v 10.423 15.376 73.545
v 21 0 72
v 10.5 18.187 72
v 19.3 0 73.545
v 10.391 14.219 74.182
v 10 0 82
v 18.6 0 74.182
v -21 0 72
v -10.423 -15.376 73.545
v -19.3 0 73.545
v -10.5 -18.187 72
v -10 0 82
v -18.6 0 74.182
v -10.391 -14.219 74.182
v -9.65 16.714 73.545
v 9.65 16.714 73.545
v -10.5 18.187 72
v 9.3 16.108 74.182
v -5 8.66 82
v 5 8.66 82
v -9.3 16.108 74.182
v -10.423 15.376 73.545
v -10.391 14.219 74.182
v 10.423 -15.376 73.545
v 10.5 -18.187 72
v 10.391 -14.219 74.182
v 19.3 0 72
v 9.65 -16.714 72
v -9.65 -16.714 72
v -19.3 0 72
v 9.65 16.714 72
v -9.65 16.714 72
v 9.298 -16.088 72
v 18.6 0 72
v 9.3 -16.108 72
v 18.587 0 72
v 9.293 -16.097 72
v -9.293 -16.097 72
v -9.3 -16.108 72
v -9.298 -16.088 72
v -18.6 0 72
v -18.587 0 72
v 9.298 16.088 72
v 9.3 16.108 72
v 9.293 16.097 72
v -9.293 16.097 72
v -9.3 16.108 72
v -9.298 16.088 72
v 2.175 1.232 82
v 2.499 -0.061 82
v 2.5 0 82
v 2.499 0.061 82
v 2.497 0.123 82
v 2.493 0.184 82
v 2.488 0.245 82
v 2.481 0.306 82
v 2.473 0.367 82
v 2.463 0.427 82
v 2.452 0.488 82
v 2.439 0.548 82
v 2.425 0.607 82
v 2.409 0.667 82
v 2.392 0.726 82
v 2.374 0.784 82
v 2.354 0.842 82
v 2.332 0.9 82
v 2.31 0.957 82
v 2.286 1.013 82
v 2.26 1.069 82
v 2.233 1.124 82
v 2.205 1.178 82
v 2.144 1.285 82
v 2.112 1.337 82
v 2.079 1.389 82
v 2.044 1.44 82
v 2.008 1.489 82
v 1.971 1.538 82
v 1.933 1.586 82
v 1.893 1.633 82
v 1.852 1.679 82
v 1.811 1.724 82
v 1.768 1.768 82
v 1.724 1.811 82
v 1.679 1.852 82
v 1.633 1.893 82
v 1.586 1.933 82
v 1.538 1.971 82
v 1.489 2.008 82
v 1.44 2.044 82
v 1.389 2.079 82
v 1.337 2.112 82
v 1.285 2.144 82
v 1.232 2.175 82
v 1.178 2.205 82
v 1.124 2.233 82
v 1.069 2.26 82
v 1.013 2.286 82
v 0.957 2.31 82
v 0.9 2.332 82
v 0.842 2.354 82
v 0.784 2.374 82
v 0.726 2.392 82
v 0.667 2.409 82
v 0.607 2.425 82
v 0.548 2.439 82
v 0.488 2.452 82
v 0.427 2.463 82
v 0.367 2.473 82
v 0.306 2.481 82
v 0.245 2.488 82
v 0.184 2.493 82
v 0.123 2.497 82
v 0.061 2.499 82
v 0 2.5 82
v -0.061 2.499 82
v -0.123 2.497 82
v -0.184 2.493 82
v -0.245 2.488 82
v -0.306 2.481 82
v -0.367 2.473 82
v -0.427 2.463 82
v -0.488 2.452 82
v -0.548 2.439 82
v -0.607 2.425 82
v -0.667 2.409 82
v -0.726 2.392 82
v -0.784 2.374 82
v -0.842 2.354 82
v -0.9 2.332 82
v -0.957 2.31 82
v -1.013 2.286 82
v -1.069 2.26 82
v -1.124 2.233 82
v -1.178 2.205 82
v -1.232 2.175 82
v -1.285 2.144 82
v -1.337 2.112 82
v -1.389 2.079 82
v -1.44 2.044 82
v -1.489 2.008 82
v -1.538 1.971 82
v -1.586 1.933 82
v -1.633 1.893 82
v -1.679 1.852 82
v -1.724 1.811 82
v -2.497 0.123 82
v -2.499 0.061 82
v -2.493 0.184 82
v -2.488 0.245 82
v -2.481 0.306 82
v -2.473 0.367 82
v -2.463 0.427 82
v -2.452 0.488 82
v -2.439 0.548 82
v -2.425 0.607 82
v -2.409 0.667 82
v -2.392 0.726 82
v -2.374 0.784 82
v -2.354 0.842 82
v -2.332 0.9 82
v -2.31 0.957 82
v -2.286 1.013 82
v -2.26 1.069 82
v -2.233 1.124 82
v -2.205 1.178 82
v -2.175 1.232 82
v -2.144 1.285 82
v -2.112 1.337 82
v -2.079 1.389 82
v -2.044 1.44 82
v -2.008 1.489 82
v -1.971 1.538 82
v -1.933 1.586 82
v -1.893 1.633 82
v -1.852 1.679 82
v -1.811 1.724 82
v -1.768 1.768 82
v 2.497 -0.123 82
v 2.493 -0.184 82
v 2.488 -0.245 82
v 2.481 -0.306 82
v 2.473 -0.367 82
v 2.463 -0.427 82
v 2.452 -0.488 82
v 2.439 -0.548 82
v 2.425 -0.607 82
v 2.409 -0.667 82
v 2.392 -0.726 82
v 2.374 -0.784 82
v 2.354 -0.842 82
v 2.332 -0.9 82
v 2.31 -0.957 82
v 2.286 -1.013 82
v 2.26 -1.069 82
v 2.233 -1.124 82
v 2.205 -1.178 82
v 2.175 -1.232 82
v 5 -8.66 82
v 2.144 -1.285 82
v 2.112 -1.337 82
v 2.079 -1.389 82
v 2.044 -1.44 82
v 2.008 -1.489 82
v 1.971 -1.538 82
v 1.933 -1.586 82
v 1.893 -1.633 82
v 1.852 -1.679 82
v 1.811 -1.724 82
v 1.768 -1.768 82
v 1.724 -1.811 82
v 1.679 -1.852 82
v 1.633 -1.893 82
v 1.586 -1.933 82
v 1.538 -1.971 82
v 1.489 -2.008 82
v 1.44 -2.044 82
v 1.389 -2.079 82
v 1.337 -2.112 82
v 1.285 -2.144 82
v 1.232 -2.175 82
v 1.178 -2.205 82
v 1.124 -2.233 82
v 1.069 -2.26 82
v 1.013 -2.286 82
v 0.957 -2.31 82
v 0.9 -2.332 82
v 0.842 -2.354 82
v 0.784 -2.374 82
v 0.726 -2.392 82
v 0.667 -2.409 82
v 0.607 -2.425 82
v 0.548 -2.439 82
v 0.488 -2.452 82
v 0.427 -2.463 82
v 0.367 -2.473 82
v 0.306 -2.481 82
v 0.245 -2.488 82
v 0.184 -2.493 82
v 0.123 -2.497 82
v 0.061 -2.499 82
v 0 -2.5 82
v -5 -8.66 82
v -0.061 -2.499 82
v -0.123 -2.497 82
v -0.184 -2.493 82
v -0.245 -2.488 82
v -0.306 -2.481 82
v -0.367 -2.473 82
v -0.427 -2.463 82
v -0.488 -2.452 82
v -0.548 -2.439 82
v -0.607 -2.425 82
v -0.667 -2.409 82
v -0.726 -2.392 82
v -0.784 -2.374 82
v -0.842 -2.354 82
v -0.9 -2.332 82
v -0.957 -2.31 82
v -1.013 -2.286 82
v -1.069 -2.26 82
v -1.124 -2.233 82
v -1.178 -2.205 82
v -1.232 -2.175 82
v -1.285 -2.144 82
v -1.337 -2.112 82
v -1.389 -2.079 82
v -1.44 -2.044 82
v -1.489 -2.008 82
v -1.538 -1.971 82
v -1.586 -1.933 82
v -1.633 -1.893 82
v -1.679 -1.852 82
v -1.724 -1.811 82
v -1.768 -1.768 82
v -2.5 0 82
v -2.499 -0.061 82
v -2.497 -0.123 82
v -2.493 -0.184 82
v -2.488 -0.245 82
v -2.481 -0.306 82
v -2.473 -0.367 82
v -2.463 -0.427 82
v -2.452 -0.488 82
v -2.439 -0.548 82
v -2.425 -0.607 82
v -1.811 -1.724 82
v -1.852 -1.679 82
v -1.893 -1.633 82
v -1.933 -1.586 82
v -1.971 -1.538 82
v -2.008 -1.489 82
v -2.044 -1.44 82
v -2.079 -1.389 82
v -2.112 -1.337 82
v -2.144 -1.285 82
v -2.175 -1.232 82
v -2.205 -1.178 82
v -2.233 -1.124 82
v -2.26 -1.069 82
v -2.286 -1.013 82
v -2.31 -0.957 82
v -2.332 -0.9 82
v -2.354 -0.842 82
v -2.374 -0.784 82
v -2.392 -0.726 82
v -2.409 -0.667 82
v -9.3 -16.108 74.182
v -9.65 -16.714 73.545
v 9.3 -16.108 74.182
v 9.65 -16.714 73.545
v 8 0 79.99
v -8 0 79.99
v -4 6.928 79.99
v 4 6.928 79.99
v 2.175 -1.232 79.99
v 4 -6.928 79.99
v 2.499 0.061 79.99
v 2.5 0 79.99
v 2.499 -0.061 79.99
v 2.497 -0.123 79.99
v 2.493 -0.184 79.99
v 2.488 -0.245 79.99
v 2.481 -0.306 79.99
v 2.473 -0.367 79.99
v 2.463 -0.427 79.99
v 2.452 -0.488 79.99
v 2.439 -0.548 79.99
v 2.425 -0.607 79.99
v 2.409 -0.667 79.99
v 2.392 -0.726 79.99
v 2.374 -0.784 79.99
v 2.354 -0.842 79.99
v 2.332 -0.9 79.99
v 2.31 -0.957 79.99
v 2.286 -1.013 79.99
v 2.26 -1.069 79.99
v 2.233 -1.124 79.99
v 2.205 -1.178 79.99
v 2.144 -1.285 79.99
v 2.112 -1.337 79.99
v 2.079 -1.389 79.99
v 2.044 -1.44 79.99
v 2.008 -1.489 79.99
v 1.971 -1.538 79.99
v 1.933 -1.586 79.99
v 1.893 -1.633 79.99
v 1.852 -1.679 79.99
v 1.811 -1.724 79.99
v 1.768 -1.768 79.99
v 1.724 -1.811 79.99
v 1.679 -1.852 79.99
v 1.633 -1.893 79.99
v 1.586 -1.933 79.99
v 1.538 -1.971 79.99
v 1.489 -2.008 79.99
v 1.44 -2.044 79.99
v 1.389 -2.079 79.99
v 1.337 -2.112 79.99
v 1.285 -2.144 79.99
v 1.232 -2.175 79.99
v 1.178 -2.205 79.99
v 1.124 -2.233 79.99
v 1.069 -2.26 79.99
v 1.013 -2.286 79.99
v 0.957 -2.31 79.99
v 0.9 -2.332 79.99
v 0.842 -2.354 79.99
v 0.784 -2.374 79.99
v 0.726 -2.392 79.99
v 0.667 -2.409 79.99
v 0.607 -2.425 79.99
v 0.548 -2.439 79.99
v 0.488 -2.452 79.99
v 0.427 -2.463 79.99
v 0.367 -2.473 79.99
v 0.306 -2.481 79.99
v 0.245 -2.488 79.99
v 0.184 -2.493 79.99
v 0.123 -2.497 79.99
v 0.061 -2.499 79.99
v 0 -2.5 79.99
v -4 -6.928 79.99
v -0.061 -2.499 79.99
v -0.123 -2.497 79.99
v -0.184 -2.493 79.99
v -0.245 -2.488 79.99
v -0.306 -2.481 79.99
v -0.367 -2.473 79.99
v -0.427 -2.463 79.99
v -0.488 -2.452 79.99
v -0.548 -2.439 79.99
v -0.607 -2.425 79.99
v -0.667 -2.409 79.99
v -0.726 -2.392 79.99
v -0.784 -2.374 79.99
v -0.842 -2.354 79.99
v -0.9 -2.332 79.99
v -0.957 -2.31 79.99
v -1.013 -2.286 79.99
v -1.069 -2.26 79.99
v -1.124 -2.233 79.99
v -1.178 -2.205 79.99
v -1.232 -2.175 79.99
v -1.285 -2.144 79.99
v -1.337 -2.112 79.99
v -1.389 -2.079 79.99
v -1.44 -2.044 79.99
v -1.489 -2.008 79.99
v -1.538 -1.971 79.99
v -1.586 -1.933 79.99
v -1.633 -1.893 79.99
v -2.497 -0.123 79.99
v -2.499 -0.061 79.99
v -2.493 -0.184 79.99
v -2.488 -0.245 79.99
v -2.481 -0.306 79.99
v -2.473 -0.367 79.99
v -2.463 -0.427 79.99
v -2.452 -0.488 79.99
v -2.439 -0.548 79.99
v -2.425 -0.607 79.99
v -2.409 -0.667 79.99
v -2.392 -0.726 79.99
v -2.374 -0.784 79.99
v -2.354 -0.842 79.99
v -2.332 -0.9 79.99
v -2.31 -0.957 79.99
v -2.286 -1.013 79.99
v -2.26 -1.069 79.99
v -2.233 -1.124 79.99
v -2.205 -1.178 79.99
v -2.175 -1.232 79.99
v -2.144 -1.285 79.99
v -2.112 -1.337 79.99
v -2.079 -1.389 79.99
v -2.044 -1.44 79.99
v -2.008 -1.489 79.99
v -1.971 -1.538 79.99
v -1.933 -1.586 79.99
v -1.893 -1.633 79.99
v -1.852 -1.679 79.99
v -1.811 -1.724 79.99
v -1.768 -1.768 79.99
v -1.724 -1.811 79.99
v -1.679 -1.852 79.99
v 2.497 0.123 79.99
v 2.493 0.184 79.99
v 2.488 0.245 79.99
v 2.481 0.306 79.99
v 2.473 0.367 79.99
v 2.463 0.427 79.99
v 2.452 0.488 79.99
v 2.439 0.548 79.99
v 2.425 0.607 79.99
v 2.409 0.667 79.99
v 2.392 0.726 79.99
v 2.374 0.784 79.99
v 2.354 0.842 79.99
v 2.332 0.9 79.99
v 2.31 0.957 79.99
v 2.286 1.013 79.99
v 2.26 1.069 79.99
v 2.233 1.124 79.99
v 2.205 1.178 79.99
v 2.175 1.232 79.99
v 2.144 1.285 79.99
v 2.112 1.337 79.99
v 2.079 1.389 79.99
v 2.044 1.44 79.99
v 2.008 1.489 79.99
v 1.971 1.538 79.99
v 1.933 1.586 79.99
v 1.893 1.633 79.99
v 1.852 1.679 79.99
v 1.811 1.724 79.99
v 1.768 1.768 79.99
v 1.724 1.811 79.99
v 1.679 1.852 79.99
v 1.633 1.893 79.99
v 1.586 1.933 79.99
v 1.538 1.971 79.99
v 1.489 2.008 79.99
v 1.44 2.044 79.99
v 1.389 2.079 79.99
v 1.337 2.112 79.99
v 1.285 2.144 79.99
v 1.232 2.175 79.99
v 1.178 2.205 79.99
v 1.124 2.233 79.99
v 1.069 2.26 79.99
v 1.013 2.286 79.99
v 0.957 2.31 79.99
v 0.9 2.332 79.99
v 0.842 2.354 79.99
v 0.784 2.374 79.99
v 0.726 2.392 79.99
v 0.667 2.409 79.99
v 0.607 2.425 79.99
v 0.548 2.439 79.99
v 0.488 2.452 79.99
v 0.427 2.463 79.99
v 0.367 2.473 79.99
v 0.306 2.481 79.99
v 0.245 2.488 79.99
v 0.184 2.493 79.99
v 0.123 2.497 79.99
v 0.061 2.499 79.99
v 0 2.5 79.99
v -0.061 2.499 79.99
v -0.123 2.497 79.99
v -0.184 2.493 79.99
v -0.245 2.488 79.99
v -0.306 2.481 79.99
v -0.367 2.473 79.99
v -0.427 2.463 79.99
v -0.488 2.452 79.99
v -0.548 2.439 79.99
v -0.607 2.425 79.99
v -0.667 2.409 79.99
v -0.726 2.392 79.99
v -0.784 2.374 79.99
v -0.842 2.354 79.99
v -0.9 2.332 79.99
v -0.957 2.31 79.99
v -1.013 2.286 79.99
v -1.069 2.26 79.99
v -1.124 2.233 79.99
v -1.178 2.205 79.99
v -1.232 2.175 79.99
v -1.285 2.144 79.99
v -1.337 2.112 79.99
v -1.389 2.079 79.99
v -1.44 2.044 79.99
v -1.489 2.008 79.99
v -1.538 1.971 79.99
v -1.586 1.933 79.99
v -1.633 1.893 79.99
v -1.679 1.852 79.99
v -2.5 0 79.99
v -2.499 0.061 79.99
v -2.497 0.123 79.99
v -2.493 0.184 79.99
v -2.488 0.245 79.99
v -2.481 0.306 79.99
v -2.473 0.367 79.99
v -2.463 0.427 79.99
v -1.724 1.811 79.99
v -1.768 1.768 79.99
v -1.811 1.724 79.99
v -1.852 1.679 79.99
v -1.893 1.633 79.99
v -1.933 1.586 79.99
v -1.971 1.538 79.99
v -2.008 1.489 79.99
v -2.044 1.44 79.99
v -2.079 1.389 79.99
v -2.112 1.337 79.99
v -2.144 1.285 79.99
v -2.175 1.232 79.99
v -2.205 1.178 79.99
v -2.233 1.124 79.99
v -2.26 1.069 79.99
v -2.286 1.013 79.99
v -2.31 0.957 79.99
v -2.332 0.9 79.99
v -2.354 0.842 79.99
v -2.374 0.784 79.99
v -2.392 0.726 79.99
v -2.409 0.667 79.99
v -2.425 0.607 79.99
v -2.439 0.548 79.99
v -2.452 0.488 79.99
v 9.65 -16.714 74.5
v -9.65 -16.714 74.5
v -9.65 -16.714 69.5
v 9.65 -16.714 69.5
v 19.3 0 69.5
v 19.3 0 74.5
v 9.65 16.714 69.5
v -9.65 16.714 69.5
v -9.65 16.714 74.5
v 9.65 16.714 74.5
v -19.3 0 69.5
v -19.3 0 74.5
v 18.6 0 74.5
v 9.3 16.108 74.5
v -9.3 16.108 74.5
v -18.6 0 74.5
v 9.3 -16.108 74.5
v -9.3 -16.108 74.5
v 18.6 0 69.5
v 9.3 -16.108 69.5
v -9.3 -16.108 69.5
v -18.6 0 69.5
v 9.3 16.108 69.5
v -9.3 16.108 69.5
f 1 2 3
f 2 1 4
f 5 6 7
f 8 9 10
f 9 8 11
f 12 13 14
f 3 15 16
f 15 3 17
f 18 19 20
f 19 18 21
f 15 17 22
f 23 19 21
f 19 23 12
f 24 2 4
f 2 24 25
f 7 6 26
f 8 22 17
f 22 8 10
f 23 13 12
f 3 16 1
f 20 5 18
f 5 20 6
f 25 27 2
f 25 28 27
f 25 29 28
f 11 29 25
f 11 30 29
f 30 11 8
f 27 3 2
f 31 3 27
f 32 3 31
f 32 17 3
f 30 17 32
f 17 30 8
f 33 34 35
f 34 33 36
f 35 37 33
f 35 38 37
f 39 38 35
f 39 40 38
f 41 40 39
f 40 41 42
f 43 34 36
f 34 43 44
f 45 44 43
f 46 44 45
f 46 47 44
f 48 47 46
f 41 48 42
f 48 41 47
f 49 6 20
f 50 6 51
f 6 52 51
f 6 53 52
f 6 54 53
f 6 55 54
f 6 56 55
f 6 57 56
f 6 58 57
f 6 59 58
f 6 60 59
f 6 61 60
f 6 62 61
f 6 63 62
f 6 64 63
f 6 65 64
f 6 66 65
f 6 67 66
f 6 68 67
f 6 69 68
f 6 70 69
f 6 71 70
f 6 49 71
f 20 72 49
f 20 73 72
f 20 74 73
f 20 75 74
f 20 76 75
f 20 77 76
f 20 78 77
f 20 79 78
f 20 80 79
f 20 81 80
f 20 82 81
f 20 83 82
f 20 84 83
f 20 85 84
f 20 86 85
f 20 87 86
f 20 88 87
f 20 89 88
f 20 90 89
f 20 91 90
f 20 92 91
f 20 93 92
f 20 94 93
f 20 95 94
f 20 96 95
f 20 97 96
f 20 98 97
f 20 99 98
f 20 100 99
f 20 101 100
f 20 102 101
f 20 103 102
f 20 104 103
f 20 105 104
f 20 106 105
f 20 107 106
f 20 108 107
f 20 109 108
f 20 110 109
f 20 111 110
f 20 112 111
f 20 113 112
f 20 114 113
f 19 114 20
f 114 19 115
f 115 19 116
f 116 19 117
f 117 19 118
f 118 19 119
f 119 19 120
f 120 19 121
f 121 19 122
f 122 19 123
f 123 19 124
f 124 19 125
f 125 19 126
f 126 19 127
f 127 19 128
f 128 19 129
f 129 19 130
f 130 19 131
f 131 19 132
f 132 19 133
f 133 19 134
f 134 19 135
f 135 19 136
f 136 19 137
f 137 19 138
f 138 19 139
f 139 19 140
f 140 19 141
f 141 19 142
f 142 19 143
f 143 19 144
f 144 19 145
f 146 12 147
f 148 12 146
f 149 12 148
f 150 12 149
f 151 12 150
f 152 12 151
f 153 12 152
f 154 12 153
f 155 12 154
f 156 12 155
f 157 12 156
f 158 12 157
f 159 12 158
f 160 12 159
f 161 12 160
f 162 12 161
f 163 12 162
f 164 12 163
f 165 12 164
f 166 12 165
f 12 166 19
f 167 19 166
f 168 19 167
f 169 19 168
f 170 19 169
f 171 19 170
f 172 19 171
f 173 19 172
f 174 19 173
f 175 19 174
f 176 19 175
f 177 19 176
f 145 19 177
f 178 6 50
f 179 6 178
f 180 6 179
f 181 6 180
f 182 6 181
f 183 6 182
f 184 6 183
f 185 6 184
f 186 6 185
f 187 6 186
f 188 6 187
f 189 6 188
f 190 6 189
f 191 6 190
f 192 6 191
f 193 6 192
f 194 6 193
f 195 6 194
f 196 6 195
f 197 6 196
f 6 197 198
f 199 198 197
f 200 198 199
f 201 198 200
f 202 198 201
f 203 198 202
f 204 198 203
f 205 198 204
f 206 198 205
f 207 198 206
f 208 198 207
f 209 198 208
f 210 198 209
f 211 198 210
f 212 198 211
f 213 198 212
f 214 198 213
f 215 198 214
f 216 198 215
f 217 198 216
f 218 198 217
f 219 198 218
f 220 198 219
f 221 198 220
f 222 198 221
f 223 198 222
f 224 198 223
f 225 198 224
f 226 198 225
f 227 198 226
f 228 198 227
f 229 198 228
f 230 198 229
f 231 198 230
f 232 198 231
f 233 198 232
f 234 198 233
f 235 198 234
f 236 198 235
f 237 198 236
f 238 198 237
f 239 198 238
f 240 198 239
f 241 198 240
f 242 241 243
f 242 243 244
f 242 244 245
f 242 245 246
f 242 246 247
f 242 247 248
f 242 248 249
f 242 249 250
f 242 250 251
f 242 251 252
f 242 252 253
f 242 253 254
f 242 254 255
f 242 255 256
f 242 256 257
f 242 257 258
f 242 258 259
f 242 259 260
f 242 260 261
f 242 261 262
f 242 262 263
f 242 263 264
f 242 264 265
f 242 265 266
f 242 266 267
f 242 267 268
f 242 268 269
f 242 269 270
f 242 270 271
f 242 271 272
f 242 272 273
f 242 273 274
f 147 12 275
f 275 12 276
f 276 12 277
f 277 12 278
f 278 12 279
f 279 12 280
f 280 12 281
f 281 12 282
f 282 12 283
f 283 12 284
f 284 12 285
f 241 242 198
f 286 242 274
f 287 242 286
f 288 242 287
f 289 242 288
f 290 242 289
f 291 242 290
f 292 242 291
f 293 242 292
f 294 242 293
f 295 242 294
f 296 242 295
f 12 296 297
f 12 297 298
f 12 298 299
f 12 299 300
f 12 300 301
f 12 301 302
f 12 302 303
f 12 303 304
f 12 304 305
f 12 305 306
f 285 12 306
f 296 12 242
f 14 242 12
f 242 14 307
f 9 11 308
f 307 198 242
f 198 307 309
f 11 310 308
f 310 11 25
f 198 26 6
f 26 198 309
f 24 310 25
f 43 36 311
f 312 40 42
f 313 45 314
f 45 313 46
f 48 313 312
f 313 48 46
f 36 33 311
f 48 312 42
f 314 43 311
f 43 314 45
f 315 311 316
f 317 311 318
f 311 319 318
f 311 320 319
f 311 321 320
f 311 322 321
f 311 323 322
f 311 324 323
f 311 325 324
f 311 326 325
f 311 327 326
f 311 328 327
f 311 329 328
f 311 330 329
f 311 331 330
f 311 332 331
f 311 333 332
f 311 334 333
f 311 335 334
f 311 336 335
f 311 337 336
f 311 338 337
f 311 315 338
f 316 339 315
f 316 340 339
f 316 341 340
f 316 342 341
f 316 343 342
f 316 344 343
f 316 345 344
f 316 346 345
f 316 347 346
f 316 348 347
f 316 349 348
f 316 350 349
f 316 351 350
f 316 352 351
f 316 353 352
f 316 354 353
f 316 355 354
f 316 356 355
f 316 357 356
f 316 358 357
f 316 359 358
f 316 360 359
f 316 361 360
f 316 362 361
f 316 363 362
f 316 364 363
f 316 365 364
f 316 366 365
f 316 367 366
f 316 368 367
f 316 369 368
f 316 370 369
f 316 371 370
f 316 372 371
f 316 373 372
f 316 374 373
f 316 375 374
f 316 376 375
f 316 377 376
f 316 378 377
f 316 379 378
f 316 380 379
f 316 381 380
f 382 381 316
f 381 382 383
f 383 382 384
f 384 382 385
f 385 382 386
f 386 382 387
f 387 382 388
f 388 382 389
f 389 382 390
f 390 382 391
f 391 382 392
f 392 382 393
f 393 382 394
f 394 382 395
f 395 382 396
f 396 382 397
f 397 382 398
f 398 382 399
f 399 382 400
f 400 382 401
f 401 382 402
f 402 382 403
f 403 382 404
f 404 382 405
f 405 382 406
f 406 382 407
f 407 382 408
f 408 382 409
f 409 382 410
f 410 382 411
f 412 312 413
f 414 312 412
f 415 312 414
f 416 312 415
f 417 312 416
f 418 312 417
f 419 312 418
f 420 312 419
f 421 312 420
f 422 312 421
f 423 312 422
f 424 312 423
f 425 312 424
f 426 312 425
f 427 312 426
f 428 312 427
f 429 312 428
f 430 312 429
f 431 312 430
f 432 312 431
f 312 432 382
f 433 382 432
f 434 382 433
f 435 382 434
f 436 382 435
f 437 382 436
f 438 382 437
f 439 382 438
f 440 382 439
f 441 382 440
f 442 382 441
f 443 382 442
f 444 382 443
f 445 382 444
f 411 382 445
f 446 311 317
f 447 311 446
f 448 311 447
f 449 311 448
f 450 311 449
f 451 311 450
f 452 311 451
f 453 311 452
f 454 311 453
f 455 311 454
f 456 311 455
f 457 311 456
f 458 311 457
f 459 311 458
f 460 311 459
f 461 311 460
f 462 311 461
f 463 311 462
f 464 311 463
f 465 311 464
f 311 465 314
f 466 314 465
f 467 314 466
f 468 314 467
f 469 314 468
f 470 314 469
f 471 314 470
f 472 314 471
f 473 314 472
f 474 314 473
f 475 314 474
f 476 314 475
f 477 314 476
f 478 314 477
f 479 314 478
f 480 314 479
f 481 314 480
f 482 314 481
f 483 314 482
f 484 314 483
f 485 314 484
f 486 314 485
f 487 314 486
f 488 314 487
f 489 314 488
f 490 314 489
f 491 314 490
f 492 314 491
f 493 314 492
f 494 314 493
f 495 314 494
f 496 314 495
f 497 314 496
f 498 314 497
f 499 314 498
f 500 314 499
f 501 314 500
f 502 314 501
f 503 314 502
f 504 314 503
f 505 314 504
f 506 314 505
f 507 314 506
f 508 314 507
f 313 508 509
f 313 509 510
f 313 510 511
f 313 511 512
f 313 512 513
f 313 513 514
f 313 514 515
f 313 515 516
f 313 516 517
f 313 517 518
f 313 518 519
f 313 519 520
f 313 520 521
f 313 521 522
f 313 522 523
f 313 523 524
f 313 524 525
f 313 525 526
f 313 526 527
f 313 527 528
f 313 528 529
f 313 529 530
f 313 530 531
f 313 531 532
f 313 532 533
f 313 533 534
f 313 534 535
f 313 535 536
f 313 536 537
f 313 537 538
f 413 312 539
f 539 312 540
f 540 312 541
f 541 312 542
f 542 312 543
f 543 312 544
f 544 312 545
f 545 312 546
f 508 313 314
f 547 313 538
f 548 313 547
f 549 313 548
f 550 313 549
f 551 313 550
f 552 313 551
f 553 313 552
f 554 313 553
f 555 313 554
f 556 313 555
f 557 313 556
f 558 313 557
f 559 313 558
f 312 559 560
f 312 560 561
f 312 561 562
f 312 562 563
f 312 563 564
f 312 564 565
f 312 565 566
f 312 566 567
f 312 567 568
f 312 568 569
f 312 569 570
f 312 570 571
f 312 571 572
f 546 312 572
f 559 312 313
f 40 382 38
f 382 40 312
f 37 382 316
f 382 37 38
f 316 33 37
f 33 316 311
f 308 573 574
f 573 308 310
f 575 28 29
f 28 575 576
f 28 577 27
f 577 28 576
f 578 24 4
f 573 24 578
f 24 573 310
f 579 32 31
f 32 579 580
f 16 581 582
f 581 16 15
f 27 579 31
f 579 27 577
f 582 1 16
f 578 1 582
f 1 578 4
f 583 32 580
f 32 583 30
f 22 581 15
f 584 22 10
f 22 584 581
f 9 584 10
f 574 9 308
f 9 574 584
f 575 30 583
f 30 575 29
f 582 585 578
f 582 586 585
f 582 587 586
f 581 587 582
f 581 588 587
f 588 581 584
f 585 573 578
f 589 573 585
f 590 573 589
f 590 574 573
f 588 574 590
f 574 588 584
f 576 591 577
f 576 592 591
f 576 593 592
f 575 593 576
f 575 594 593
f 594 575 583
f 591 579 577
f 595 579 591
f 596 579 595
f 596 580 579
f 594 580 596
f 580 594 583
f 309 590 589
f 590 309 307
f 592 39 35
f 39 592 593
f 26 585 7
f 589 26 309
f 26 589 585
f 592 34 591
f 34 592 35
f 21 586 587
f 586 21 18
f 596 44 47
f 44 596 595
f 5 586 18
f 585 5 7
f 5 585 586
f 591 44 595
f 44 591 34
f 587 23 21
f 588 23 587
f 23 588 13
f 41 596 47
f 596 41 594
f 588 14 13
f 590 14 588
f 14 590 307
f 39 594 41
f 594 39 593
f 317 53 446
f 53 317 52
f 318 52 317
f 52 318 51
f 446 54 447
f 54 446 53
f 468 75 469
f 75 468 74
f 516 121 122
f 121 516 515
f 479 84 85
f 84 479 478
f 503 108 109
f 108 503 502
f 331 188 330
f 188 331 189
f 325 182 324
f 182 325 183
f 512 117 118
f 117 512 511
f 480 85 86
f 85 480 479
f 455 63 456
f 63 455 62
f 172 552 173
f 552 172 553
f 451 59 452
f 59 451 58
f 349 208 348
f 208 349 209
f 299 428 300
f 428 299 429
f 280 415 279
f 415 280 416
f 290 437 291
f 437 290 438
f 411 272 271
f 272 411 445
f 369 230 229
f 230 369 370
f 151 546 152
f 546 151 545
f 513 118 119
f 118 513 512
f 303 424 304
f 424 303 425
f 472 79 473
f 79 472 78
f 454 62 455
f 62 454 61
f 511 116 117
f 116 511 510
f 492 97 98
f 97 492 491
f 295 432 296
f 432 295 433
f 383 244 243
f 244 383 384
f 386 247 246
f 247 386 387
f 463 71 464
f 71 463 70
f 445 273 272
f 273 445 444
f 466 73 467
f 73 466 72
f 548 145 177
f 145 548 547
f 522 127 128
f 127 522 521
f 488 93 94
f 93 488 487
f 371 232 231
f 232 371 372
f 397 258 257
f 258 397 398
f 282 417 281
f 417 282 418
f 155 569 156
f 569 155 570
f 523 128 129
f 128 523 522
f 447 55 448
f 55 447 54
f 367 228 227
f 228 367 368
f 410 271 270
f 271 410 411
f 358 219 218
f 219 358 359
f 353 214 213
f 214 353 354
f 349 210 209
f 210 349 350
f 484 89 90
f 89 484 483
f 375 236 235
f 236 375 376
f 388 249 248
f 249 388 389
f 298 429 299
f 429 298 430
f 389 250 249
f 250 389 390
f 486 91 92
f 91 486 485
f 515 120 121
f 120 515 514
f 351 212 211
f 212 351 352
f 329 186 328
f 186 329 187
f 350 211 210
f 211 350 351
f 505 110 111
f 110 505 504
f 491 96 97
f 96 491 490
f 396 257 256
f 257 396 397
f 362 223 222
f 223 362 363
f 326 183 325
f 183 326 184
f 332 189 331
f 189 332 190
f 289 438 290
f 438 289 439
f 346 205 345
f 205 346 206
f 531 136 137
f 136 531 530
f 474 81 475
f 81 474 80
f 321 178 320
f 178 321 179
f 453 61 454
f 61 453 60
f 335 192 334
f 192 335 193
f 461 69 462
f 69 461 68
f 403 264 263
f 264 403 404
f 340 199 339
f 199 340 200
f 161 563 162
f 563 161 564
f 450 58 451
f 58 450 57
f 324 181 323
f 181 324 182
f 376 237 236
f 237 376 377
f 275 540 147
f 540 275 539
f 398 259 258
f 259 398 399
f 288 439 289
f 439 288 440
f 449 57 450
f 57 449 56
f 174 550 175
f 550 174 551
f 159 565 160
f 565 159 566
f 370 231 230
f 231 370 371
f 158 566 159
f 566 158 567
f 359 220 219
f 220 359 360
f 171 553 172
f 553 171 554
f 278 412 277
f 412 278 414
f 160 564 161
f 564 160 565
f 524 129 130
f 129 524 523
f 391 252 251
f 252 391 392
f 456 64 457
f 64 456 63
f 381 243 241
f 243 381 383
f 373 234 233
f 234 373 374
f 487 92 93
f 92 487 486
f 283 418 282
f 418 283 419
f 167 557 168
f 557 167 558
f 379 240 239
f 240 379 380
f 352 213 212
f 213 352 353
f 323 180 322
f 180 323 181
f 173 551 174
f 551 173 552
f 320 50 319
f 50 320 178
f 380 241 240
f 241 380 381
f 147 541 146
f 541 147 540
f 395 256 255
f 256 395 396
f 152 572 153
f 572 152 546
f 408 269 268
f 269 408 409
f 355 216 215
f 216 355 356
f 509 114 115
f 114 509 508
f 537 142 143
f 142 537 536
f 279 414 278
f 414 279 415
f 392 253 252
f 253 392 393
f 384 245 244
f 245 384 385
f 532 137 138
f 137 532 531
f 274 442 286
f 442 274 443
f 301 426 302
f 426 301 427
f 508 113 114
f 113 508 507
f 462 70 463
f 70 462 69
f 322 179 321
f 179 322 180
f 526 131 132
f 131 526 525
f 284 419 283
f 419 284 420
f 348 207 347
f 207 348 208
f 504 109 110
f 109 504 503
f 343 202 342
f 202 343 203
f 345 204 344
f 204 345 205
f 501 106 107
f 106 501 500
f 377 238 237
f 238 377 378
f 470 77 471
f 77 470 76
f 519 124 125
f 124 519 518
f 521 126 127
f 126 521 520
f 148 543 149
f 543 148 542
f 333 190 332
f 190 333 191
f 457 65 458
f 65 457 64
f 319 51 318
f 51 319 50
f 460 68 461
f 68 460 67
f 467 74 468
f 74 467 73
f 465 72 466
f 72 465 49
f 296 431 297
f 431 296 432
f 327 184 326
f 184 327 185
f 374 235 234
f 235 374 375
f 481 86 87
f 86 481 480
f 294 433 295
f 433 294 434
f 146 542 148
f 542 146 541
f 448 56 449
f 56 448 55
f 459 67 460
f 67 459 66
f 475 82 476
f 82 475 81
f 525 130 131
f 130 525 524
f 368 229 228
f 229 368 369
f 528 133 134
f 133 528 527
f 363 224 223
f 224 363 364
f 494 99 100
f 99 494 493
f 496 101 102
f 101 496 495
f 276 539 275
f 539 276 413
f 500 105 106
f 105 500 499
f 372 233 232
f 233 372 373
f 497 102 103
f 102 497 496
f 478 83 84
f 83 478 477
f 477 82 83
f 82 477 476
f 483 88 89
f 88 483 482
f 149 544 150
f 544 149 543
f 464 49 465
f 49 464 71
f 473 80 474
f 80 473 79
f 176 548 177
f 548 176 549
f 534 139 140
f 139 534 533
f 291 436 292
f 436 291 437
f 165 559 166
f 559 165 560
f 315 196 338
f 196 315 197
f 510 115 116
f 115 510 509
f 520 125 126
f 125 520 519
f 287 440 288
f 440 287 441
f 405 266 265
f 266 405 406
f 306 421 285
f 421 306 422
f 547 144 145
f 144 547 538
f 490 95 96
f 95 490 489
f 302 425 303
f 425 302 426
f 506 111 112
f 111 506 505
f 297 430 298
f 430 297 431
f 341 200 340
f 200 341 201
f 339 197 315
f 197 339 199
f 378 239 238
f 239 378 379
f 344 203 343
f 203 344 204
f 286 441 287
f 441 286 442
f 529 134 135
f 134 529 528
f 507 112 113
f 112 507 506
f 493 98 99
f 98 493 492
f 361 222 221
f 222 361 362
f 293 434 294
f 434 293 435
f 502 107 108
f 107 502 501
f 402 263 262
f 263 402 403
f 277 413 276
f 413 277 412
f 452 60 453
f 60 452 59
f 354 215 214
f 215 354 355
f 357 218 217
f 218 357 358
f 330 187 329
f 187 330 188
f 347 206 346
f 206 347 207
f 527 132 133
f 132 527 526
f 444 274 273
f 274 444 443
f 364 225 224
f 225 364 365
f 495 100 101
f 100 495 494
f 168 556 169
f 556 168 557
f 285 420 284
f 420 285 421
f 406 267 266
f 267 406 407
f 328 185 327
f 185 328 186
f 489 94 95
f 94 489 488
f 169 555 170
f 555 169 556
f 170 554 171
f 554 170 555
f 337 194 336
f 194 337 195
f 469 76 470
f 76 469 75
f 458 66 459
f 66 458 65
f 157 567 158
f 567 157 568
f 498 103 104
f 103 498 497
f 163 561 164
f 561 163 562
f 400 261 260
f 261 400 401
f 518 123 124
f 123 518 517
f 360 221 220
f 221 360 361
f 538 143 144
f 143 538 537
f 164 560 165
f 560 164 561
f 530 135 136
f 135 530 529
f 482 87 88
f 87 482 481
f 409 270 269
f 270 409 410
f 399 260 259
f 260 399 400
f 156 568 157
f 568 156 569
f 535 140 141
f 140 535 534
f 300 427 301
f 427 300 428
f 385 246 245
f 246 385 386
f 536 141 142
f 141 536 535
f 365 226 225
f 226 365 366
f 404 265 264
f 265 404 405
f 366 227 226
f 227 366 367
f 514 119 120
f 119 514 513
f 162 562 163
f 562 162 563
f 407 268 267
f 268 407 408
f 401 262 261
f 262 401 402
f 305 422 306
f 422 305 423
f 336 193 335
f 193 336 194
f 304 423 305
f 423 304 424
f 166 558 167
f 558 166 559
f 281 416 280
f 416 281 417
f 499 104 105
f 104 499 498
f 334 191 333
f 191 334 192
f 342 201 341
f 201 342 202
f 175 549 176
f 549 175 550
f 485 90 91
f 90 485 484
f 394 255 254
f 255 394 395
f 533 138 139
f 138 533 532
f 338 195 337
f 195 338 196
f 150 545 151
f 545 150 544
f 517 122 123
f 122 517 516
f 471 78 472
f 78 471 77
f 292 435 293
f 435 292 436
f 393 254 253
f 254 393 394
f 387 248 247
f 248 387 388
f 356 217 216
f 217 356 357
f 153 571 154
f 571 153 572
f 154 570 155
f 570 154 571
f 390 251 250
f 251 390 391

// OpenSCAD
translate(v = [0, 0, 77.0000000000]) {
	rotate(a = [0, 0, 0]) {
		difference() {
			union() {
				translate(v = [0, 0, 0]) {
					rotate(a = [0, 0, 0]) {
						difference() {
							translate(v = [0, 0, 0]) {
								rotate(a = [0, 0, 0]) {
									cylinder($fn = 6, center = true, h = 10, r1 = 21, r2 = 10);
								}
							}
							translate(v = [0, 0, -1.0100000000]) {
								rotate(a = [0, 0, 0]) {
									cylinder($fn = 6, center = true, h = 8, r1 = 18.6000000000, r2 = 8);
								}
							}
						}
					}
				}
				translate(v = [0, 0, -5.0000000000]) {
					rotate(a = [0, 0, 0]) {
						difference() {
							translate(v = [0, 0, 0]) {
								rotate(a = [0, 0, 0]) {
									cylinder($fn = 6, center = true, h = 5, r1 = 19.3000000000, r2 = 19.3000000000);
								}
							}
							translate(v = [0, 0, 0]) {
								rotate(a = [0, 0, 0]) {
									cylinder($fn = 6, center = true, h = 7, r1 = 18.6000000000, r2 = 18.6000000000);
								}
							}
						}
					}
				}
			}
			translate(v = [0, 0, 0]) {
				rotate(a = [0, 0, 0]) {
					cylinder($fn = 256, center = true, h = 20, r1 = 2.5000000000, r2 = 2.5000000000);
				}
			}
		}
	}
}
/***********************************************
*********      SolidPython code:      **********
************************************************
 
__author__ = 'Mark Weinreuter'

from config import *


def ground_pipe():
    fit = 0.05
    pipe = CY(block_hole_r_mm-fit, block_hole_h_mm, segments=256)
    c = CY(cable_r_mm, block_hole_h_mm+2, segments=256)
    scad_render_to_file(pipe-c, "scad/cable_pipe.scad")


def tile_blocker(tile_blocker_h_mm=5):
    top = CY(r1=block_r_mm, r2=0, h=tile_blocker_h_mm, segments=6)

    tb = make_base()
    top.bottom = block_base_h_mm / 2
    tb += top
    scad_render_to_file(tb, "scad/tile_blocker.scad")


def laser_start():
    ls = make_base(True)
    t_h_mm = 50
    l_r = 3.25
    l_b_off = t_h_mm/1.5
    t_th = 1.2
    t_r_mm = block_r_mm
    turret = CY(t_r_mm, t_h_mm, segments=6)
    c2 = CY(t_r_mm - t_th, t_h_mm + 2, segments=6)
    turret = W(turret - c2, d=t_h_mm)
    turret.bottom = ls.top
    l_hole = CY(l_r, t_r_mm * 1 + 2, segments=256)
    # rotate cylinder in place
    l_hole.ry = 90
    l_hole.rz = 90
    # offset the cylinder
    l_hole.z = turret.bottom + l_b_off
    l_hole.x = math.cos(90 / 180 * math.pi) * t_r_mm
    l_hole.y = math.sin(90 / 180 * math.pi) * t_r_mm

    top_h_mm = 10
    con_h_mm = 5
    top = CY(r1=t_r_mm, r2=10, h=top_h_mm, segments=6)
    # hollow out the top
    topC = CY(r1=t_r_mm - t_th*2, r2=10 - 2, h=top_h_mm - 2, segments=6)
    topC.bottom = top.bottom - 0.01  # just for a better preview
    top_con = CY(r1=t_r_mm - t_th - 0.5, h=con_h_mm, segments=6)
    top_con_hole = CY(r1=t_r_mm - t_th * 2, h=con_h_mm+2, segments=6)
    top_con = W(top_con-top_con_hole, h=con_h_mm)
    top_con.top = top.bottom

    top = W(top - topC, d=top_h_mm)
    top = W((top + top_con) -CY(r1=2.5,h=20,segments=256)(), d=top_h_mm)

    top.bottom = turret.top + 20
    ls += (turret - l_hole)

    scad_render_to_file(ls(), "scad/laser_start.scad")
    scad_render_to_file(top(), "scad/laser_start_top.scad")



laser_start()
ground_pipe()
 
 
************************************************/
